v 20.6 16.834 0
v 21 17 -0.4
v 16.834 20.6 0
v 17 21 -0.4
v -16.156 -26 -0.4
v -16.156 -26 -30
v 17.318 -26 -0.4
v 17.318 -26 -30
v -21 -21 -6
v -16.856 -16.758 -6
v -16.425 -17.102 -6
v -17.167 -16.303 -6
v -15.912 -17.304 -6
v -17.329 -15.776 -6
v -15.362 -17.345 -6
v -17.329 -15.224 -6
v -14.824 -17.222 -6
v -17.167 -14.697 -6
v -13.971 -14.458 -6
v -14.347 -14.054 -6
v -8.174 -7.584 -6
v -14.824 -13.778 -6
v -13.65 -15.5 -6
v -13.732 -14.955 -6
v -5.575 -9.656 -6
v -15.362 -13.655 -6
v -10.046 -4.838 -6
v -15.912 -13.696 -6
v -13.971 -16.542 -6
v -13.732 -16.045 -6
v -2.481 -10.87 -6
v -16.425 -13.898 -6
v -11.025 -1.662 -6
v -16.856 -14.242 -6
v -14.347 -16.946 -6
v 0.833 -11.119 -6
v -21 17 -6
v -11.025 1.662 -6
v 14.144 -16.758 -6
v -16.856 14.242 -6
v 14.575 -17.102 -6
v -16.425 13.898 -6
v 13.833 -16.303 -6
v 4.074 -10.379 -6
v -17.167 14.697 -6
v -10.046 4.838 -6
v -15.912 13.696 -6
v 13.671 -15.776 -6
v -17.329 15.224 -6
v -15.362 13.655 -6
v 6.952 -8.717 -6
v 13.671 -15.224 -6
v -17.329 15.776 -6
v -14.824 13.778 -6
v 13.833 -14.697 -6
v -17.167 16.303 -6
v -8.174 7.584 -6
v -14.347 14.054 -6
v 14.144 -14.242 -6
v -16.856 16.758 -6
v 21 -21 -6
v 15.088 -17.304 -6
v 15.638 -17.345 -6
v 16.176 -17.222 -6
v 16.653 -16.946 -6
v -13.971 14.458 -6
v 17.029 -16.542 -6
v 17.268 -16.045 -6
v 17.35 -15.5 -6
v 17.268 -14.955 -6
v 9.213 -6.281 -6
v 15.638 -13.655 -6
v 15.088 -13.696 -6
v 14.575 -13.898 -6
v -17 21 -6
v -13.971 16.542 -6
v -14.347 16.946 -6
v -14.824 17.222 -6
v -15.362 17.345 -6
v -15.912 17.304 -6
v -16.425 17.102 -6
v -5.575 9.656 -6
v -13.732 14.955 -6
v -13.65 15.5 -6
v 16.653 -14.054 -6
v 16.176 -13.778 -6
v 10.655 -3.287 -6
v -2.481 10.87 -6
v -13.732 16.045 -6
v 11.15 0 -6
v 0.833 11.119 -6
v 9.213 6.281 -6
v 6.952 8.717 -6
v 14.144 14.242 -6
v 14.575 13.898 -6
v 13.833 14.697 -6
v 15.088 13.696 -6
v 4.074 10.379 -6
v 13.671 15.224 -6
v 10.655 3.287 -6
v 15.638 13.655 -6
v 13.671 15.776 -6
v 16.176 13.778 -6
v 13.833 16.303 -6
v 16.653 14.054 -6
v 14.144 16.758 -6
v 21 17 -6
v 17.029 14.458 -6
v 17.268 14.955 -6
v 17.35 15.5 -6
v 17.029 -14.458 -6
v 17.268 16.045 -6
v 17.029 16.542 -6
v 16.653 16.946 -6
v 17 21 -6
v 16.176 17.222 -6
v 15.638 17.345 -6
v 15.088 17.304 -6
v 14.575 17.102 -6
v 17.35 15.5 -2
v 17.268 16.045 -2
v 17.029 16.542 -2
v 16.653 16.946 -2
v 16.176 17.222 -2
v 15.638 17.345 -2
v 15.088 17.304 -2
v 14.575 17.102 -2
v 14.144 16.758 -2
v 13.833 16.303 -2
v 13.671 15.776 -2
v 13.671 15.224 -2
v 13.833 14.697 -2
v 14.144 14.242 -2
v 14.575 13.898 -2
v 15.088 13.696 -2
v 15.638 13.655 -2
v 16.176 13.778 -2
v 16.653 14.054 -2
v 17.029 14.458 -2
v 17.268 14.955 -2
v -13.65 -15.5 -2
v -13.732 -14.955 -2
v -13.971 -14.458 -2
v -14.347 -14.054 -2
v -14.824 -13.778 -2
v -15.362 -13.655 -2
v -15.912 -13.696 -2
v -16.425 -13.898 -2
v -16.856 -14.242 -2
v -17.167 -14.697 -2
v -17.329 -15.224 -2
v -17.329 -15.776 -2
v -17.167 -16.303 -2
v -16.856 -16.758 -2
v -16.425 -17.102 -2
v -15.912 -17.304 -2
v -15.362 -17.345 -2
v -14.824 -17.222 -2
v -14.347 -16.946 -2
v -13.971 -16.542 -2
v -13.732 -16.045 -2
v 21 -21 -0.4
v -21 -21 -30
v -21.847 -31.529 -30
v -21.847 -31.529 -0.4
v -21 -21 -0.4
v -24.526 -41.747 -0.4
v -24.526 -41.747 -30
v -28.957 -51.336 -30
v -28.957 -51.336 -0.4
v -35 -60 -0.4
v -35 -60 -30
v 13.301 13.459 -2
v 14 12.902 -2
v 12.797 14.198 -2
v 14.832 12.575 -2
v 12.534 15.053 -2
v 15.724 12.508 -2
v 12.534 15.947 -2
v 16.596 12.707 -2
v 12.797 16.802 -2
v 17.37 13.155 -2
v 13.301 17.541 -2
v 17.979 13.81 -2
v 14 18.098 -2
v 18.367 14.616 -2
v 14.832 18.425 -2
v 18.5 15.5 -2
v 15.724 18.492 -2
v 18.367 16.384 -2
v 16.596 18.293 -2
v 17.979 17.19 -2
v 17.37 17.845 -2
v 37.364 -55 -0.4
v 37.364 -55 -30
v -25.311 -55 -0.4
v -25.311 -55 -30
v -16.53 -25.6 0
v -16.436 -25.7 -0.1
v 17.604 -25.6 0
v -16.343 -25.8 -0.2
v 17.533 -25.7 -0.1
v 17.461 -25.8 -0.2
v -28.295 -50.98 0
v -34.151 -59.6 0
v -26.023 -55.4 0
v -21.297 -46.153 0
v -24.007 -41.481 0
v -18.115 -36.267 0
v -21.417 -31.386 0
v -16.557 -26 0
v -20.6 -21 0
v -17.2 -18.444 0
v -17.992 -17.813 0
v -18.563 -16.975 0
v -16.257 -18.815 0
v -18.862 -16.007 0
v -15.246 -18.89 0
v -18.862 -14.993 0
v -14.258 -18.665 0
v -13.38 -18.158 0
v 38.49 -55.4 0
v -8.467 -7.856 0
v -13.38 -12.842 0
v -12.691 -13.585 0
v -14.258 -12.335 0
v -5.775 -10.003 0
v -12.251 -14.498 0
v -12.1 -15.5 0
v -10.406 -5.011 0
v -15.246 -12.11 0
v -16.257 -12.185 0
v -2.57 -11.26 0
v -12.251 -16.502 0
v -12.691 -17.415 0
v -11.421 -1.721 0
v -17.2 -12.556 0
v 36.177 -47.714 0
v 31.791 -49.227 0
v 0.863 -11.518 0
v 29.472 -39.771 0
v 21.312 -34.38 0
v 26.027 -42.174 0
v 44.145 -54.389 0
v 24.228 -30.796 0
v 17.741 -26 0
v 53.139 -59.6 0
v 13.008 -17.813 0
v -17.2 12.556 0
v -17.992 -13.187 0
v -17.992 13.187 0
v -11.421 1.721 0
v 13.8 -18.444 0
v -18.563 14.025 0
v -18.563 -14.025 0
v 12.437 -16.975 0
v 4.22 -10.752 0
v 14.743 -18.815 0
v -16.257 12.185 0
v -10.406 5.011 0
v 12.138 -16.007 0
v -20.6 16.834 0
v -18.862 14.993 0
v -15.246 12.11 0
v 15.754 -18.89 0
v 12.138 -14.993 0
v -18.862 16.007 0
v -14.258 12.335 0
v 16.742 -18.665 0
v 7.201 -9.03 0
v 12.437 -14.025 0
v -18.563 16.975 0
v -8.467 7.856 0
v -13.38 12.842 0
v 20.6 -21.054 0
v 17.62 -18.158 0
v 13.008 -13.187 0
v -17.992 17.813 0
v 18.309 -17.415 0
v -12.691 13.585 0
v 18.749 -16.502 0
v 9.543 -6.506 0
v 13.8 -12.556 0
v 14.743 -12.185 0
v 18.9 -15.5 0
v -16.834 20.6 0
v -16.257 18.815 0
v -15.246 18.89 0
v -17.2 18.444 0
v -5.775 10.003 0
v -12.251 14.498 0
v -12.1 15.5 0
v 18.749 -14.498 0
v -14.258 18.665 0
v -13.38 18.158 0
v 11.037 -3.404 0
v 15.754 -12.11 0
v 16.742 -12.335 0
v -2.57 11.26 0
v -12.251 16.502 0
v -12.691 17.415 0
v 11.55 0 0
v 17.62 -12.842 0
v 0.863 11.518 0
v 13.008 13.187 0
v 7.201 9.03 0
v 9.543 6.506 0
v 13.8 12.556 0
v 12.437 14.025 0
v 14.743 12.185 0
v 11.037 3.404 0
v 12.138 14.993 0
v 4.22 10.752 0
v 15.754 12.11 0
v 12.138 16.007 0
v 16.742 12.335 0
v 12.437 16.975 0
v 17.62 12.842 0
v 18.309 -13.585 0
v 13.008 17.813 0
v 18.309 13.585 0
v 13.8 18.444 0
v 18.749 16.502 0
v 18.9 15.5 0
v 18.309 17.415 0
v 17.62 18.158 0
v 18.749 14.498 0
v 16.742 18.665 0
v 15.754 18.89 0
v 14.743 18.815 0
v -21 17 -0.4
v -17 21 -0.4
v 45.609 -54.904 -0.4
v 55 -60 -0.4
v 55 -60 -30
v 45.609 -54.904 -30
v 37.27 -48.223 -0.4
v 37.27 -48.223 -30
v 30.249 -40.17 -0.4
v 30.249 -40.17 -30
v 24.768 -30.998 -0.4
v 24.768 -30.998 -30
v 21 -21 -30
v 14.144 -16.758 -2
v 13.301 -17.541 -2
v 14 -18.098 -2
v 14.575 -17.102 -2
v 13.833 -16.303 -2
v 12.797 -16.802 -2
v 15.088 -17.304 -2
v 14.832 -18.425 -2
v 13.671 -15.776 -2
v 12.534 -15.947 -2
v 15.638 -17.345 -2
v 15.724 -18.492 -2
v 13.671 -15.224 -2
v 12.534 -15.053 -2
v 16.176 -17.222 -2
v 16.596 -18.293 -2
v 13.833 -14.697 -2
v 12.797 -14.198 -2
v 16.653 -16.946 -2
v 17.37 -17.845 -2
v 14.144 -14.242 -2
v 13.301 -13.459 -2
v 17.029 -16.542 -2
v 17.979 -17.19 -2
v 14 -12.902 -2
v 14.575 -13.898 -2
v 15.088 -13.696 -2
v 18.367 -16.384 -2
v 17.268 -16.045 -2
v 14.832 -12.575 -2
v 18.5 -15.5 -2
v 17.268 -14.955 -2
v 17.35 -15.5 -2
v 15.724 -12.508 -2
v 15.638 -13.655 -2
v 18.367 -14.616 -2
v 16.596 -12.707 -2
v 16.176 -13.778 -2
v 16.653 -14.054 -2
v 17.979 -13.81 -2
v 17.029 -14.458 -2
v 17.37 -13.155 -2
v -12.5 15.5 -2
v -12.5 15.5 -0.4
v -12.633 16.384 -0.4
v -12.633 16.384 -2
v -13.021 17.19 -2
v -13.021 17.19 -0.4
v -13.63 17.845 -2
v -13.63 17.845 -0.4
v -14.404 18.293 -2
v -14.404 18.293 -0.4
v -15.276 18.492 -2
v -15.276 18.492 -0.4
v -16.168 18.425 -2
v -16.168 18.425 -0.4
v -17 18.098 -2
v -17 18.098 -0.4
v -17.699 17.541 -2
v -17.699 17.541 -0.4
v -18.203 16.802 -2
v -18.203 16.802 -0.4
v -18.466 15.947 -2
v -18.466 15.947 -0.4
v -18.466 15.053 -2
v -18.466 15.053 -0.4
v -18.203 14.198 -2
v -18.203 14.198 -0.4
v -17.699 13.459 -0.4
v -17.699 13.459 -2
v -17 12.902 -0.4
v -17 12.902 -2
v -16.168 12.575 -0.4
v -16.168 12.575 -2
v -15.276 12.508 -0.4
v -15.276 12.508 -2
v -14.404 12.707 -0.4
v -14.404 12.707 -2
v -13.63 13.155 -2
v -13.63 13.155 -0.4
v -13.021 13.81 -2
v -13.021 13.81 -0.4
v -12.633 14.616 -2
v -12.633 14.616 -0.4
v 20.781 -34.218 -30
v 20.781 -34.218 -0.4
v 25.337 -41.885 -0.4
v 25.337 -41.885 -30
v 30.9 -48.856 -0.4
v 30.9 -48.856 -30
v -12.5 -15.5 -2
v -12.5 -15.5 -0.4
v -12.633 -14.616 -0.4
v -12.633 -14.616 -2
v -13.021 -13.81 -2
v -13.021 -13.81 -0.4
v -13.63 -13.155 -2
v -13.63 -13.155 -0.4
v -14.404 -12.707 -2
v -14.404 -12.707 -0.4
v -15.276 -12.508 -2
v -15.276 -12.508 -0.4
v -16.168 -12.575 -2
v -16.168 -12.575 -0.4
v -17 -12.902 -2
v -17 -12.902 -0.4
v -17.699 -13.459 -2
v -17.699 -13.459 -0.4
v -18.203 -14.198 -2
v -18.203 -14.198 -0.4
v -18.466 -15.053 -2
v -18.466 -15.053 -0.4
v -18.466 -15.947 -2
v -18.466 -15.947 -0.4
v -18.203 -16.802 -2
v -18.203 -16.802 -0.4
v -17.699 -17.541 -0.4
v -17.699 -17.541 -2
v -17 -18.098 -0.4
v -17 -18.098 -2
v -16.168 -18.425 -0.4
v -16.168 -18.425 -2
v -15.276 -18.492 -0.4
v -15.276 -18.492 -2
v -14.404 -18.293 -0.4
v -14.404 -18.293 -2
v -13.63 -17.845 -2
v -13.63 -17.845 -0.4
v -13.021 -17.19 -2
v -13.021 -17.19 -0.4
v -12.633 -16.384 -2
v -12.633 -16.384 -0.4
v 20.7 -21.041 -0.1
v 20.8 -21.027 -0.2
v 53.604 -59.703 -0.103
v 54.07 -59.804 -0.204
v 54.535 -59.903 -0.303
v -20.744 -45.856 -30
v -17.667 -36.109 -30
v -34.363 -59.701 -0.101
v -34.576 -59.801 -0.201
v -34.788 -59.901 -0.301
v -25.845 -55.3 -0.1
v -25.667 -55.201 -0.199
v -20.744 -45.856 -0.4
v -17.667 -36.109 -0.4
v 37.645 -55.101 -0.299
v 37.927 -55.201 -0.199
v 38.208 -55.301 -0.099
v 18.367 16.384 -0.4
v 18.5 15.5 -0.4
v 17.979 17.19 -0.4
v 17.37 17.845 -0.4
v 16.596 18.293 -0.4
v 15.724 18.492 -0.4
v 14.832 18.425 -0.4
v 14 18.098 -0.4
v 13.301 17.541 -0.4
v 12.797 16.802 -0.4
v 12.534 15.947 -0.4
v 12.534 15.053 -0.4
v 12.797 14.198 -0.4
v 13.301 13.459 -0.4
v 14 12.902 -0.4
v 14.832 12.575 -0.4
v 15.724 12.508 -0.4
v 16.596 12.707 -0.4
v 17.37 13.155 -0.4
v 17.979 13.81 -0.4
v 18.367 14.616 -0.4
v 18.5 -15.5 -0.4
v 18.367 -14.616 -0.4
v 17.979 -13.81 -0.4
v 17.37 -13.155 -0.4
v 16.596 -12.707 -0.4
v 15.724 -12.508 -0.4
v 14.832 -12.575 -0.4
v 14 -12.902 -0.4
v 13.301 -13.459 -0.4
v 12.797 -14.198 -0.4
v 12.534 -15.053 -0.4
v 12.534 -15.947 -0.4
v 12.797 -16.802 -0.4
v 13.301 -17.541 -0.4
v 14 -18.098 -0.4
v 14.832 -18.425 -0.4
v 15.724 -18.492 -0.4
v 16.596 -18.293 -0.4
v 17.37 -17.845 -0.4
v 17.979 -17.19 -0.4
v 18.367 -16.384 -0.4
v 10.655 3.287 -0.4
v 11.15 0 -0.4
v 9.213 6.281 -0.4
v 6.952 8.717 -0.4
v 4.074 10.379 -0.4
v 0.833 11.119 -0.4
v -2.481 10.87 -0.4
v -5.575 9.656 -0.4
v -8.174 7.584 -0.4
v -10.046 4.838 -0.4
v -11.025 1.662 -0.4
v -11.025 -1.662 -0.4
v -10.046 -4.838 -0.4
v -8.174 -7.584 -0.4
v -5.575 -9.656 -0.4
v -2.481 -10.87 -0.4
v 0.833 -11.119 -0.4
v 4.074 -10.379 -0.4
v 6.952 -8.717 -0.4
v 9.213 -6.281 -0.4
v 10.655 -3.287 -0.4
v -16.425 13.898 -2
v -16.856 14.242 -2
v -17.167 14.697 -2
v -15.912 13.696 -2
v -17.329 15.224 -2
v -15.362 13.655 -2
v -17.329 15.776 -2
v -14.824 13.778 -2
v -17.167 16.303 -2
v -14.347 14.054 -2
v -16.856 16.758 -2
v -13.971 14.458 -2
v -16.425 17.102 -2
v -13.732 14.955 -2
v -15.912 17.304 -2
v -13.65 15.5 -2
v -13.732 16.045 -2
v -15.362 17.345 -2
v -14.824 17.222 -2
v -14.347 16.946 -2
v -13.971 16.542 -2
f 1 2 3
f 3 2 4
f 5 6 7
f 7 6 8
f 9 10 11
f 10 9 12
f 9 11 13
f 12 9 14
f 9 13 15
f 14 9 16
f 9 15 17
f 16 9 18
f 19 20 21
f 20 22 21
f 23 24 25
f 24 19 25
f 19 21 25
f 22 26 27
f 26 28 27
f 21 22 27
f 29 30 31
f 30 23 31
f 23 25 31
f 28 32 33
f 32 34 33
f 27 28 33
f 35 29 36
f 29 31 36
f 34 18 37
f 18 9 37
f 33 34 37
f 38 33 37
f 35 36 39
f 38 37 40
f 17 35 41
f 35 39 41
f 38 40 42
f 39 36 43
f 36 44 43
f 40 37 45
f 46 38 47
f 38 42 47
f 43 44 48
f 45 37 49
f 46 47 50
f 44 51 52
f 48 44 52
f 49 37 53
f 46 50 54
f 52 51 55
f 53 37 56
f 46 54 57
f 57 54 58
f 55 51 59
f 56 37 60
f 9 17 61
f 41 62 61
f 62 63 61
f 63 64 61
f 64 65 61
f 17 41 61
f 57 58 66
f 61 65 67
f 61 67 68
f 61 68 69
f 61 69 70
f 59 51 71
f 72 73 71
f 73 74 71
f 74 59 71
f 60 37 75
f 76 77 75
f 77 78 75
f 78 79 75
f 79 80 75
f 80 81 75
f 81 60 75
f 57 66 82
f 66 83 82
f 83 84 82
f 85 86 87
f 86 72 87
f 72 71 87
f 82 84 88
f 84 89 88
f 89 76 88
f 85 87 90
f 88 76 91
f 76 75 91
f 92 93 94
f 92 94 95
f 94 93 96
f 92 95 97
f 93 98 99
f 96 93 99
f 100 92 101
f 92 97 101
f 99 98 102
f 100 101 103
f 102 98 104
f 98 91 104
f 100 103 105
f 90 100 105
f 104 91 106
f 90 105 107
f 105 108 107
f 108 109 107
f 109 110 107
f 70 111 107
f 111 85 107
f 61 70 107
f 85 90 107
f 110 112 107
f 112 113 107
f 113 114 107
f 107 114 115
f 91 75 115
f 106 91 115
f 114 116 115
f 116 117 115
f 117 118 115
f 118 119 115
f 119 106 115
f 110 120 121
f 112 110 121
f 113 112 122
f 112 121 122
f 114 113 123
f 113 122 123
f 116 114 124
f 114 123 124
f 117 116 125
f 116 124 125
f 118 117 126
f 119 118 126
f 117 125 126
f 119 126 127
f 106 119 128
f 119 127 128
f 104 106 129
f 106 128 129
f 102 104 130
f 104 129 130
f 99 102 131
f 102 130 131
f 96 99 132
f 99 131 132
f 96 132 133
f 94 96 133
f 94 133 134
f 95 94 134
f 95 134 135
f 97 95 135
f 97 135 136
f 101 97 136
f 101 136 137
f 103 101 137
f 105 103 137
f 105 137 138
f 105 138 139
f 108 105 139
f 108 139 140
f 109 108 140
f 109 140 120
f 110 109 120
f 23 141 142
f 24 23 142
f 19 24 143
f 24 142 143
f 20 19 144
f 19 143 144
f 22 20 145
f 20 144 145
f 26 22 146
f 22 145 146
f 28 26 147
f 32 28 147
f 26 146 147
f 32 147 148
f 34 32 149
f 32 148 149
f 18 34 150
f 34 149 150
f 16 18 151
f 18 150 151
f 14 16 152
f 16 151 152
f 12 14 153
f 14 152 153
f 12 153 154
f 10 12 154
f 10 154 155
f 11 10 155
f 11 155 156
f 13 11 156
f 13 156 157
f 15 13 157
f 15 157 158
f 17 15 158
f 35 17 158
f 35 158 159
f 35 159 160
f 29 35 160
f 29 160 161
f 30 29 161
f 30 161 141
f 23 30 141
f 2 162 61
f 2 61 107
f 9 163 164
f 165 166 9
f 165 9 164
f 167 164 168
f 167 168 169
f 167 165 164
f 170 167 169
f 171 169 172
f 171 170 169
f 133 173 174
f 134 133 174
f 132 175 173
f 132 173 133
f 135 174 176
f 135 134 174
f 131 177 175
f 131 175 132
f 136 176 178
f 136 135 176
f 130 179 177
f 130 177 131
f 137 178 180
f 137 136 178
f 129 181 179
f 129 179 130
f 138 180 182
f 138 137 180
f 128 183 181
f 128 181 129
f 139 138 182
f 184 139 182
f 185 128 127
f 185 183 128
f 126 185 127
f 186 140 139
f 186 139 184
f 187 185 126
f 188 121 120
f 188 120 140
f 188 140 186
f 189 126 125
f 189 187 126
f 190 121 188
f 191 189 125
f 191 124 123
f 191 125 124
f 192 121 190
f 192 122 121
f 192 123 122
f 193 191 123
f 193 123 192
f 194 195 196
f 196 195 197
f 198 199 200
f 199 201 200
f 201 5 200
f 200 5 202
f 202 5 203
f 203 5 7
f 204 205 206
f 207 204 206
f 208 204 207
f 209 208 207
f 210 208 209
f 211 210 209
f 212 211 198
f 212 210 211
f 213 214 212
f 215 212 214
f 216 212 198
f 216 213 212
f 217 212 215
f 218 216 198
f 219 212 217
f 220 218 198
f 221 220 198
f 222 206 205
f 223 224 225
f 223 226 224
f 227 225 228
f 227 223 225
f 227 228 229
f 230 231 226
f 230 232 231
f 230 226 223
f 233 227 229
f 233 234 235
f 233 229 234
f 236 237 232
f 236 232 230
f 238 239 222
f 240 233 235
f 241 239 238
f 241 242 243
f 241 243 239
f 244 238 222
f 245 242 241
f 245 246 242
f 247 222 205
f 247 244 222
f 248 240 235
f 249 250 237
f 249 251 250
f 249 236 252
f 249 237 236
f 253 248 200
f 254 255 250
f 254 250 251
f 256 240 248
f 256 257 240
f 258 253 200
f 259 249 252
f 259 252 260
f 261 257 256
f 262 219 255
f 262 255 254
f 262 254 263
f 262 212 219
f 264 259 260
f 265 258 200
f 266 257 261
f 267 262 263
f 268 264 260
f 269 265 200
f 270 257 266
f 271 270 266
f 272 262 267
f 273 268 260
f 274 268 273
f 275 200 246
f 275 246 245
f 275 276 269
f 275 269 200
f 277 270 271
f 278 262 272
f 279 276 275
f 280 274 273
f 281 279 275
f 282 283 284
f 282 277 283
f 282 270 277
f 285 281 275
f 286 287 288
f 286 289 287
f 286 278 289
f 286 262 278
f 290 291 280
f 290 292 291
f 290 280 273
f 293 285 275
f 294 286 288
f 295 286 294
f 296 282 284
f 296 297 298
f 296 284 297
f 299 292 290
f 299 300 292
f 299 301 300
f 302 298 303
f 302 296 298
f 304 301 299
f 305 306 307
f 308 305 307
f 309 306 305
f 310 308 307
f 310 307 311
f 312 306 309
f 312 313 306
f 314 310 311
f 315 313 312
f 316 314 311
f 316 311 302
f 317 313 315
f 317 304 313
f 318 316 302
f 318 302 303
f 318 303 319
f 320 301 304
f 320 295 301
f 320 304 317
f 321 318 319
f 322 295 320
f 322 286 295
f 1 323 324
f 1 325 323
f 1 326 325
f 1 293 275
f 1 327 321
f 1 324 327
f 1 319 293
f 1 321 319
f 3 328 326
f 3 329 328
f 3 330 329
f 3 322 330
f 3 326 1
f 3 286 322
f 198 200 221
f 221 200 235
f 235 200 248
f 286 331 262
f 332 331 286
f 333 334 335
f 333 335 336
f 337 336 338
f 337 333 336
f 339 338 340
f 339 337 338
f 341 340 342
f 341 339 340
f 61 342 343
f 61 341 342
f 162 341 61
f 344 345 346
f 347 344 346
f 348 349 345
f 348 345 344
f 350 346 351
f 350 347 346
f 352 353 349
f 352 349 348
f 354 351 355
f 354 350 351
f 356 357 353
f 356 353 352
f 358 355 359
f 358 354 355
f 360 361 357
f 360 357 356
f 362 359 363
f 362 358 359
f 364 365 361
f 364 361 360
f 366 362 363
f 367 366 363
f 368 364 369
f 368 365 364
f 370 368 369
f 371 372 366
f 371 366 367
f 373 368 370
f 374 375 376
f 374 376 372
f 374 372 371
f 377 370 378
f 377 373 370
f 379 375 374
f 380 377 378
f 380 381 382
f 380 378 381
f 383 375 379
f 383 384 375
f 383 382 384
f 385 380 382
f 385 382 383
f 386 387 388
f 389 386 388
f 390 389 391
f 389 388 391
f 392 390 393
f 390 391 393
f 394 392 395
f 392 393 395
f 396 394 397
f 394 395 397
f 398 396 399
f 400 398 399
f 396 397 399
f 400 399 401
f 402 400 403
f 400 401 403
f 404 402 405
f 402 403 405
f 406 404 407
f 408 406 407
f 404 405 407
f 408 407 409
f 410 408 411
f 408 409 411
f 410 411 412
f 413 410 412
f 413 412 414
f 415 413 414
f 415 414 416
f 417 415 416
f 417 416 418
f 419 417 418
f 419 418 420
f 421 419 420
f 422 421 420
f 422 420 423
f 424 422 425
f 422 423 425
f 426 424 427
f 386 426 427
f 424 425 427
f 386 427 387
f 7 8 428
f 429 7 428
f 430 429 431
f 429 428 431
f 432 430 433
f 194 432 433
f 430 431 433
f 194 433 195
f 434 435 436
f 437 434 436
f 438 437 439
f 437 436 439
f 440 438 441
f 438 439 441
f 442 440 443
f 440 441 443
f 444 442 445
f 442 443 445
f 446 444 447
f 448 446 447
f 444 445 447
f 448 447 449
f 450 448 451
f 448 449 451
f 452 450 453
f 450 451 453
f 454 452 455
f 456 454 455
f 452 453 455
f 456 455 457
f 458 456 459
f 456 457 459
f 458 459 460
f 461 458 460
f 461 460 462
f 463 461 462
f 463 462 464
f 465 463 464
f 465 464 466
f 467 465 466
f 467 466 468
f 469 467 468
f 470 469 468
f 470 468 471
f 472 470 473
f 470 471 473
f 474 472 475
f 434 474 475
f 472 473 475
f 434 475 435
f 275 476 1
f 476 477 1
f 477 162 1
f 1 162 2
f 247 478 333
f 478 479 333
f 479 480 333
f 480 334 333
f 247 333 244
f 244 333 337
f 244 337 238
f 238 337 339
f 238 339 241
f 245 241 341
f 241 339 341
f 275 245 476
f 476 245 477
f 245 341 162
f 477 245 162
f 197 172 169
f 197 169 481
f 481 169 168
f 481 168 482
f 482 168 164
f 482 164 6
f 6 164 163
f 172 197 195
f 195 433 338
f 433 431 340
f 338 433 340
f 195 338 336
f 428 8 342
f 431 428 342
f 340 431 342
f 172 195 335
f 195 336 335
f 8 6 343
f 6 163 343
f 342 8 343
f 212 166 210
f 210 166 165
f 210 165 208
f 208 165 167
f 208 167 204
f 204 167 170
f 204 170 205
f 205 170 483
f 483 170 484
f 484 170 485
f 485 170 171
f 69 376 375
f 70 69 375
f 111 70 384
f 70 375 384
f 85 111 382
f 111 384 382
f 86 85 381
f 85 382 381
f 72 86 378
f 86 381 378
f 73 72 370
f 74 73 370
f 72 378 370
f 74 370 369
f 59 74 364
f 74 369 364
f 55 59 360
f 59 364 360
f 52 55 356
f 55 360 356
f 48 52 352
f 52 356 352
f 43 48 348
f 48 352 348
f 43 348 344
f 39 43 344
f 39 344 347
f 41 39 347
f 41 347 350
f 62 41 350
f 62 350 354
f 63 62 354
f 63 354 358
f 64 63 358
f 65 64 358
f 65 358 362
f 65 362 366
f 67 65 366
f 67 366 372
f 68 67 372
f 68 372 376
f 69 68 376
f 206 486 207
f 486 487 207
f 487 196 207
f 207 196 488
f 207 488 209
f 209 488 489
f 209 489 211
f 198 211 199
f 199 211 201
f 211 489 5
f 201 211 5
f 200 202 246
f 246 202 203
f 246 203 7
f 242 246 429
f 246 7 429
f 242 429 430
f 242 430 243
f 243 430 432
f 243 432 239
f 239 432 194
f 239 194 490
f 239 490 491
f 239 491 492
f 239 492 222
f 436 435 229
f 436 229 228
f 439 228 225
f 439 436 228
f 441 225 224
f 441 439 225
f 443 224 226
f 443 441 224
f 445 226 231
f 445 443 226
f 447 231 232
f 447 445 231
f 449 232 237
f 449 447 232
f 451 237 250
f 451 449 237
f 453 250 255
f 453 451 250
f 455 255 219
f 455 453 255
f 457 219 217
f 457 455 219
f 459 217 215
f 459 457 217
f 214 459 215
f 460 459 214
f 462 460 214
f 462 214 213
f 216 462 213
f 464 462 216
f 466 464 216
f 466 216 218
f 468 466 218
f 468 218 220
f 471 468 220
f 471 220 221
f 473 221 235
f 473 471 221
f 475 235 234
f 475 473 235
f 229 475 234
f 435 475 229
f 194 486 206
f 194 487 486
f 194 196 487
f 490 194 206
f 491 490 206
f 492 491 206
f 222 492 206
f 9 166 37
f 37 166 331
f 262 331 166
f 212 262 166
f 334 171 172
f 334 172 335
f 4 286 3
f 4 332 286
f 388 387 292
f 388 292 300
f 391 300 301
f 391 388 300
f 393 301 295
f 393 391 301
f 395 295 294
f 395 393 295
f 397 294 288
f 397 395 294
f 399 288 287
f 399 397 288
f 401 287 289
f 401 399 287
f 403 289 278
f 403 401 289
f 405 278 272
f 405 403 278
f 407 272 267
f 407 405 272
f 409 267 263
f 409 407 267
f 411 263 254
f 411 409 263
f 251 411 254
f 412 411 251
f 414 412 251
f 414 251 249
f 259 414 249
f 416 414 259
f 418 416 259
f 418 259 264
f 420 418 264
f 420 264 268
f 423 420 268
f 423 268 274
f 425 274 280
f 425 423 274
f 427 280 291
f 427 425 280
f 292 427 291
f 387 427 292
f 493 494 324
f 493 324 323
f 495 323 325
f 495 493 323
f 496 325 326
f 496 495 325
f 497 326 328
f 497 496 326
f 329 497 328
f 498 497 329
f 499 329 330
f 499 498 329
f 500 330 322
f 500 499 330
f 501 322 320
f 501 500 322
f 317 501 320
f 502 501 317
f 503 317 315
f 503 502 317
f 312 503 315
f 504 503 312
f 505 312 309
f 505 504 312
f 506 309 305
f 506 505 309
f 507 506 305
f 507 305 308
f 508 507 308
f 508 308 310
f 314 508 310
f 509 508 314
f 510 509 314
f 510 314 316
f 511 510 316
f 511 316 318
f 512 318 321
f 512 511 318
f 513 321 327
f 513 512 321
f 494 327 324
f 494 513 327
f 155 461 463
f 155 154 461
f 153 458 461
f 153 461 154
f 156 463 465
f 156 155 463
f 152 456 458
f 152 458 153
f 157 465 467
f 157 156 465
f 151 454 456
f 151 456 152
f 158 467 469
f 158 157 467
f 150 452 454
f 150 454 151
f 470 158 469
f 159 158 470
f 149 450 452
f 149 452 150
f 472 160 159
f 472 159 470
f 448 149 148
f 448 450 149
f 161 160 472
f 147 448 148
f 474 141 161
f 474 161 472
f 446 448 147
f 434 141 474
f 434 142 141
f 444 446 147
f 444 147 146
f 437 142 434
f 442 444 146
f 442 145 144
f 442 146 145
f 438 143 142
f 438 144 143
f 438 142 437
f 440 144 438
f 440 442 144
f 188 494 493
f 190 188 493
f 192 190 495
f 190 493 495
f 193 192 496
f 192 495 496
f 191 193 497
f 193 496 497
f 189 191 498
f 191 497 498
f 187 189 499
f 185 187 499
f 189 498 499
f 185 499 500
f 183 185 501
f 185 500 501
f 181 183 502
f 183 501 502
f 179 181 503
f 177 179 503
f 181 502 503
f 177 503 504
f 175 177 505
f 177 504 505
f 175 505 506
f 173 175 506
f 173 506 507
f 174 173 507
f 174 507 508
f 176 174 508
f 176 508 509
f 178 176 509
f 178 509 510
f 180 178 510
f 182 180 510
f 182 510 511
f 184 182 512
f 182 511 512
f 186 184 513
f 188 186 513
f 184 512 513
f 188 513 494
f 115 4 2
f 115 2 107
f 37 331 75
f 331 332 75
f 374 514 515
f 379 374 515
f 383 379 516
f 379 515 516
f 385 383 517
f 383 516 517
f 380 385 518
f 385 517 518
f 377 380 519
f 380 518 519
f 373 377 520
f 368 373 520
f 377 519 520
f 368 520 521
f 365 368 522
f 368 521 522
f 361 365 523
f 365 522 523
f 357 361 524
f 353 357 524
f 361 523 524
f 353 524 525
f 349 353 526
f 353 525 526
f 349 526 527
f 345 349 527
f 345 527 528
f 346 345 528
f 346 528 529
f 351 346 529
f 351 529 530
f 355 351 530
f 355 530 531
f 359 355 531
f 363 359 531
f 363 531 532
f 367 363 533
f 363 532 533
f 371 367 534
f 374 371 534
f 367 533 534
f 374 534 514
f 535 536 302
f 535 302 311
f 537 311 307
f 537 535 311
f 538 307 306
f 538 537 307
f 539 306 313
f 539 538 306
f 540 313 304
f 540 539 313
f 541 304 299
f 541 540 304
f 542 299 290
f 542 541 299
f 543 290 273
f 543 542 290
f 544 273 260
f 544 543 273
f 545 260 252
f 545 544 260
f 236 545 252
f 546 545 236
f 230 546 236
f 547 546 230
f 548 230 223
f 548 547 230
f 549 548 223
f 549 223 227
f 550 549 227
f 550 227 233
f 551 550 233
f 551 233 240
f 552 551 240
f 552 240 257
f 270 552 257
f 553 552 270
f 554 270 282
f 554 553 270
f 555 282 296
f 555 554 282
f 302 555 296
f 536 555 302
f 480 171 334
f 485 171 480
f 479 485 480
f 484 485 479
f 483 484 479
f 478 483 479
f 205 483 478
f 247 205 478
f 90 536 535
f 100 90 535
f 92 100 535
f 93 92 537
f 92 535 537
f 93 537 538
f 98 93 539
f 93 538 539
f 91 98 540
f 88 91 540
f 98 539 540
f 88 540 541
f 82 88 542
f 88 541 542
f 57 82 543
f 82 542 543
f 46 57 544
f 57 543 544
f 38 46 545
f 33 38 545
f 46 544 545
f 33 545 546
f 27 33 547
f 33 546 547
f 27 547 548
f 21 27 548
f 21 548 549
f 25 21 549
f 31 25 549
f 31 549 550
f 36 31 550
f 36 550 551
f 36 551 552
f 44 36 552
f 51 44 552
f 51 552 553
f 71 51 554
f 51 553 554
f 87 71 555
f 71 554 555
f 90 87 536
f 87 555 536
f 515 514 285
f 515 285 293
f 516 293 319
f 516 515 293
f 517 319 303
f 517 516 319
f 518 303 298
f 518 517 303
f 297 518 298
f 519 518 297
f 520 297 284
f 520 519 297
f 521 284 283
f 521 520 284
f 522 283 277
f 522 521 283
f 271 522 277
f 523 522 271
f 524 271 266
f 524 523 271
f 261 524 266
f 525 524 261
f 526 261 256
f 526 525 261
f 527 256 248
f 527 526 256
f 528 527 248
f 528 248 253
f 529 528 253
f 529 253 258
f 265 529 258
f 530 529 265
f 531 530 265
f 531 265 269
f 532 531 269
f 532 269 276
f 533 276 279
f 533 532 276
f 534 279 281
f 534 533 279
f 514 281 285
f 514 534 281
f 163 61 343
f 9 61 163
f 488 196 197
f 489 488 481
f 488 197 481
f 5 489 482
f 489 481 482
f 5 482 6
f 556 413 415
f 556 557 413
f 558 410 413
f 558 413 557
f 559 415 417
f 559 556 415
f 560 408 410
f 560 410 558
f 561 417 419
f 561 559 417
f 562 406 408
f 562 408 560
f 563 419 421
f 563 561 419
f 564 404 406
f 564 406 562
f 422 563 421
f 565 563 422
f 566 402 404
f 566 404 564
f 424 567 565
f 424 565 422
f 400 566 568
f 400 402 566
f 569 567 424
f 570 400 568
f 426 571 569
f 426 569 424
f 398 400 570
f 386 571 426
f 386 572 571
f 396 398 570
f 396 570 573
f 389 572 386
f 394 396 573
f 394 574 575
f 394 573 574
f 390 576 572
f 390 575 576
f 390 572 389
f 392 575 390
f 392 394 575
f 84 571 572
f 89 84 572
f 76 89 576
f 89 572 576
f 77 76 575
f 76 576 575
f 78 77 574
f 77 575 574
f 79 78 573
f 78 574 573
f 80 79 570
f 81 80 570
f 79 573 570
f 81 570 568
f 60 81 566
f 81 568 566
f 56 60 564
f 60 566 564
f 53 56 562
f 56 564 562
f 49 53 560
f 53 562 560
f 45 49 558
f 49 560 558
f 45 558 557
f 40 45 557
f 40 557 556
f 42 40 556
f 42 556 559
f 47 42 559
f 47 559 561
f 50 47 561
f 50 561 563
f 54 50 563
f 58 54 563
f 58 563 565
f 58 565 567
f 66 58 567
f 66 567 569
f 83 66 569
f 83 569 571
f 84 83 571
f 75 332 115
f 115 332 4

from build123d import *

# Parameters (mm, degrees)
SKETCH1_W           = 42
SKETCH1_H           = 42
SKETCH1_R           = 11.15
SKETCH1_R_2         = 1.85
BOSS_EXTRUDE1_DEPTH = 6
BOSS_EXTRUDE2_DEPTH = 30
CUT_EXTRUDE1_DEPTH  = 87.746757864
SKETCH4_R           = 3
CUT_EXTRUDE2_DEPTH  = 2
CHAMFER1_SIZE       = 4
CHAMFER2_SIZE       = 0.4


with BuildPart() as part:
    # Sketch1 → Boss-Extrude1 (new body)
    with BuildSketch(Plane.XY):
        Rectangle(SKETCH1_W, SKETCH1_H)
        Circle(SKETCH1_R, mode=Mode.SUBTRACT)
        with Locations((15.5, 15.5)):
            Circle(SKETCH1_R_2, mode=Mode.SUBTRACT)
        with Locations((-15.5, 15.5)):
            Circle(SKETCH1_R_2, mode=Mode.SUBTRACT)
        with Locations((-15.5, -15.5)):
            Circle(SKETCH1_R_2, mode=Mode.SUBTRACT)
        with Locations((15.5, -15.5)):
            Circle(SKETCH1_R_2, mode=Mode.SUBTRACT)
    extrude(amount=-BOSS_EXTRUDE1_DEPTH)

    # Sketch2 → Boss-Extrude2 (add)
    with BuildSketch(Plane.XY):
        with BuildLine():
            Line((-35, -60), (55, -60))
            ThreePointArc((55, -60), (33.580179579, -44.353176778), (21, -21))
            Line((21, -21), (-21, -21))
            ThreePointArc((-21, -21), (-24.526439247, -41.746919245), (-35, -60))
        make_face()
    extrude(amount=-BOSS_EXTRUDE2_DEPTH)

    # Sketch3 → Cut-Extrude1 (cut, through all)
    with BuildSketch(Plane(origin=(0, 0, -30), x_dir=(-1, 0, 0), z_dir=(0, 0, -1))):
        with BuildLine():
            Line((-37.363801429, -55), (25.310808042, -55))
            ThreePointArc((25.310808042, -55), (19.013466657, -41.042936644), (16.155813219, -26))
            Line((16.155813219, -26), (-17.317950087, -26))
            ThreePointArc((-17.317950087, -26), (-25.337253654, -41.884976236), (-37.363801429, -55))
        make_face()
    extrude(amount=-CUT_EXTRUDE1_DEPTH, mode=Mode.SUBTRACT)

    # Sketch4 → Cut-Extrude2 (cut)
    with BuildSketch(Plane.XY):
        with Locations((15.5, 15.5)):
            Circle(SKETCH4_R)
        with Locations((15.5, -15.5)):
            Circle(SKETCH4_R)
        with Locations((-15.5, -15.5)):
            Circle(SKETCH4_R)
        with Locations((-15.5, 15.5)):
            Circle(SKETCH4_R)
    extrude(amount=-CUT_EXTRUDE2_DEPTH, mode=Mode.SUBTRACT)

    # Chamfer1
    chamfer1_edges = [part.edges().sort_by_distance(p)[0] for p in [
        (-21, 21, -3),
        (21, 21, -3),
    ]]
    chamfer(chamfer1_edges, length=CHAMFER1_SIZE)

    # Chamfer2
    chamfer2_edges = [part.edges().sort_by_distance(p)[0] for p in [
        (21, -2, 0),
    ]]
    chamfer(chamfer2_edges, length=CHAMFER2_SIZE)
    chamfer2_2_edges = [part.edges().sort_by_distance(p)[0] for p in [
        (18.8, 19.2, 0),
    ]]
    chamfer(chamfer2_2_edges, length=CHAMFER2_SIZE)
    chamfer2_3_edges = [part.edges().sort_by_distance(p)[0] for p in [
        (33.580179579, -44.353176778, 0),
    ]]
    chamfer(chamfer2_3_edges, length=CHAMFER2_SIZE)
    chamfer2_4_edges = [part.edges().sort_by_distance(p)[0] for p in [
        (-0.282842712, 21, 0),
    ]]
    chamfer(chamfer2_4_edges, length=CHAMFER2_SIZE)
    chamfer2_5_edges = [part.edges().sort_by_distance(p)[0] for p in [
        (9.504567043, -60, 0),
    ]]
    chamfer(chamfer2_5_edges, length=CHAMFER2_SIZE)
    chamfer2_6_edges = [part.edges().sort_by_distance(p)[0] for p in [
        (-19.2, 18.8, 0),
    ]]
    chamfer(chamfer2_6_edges, length=CHAMFER2_SIZE)
    chamfer2_7_edges = [part.edges().sort_by_distance(p)[0] for p in [
        (-24.439144818, -41.502075341, 0),
        (-21, -2.282842712, 0),
    ]]
    chamfer(chamfer2_7_edges, length=CHAMFER2_SIZE)
    chamfer2_8_edges = [part.edges().sort_by_distance(p)[0] for p in [
        (6.026496693, -55, 0),
    ]]
    chamfer(chamfer2_8_edges, length=CHAMFER2_SIZE)
    chamfer2_9_edges = [part.edges().sort_by_distance(p)[0] for p in [
        (-19.013466657, -41.042936644, 0),
    ]]
    chamfer(chamfer2_9_edges, length=CHAMFER2_SIZE)
    chamfer2_10_edges = [part.edges().sort_by_distance(p)[0] for p in [
        (25.337253654, -41.884976236, 0),
    ]]
    chamfer(chamfer2_10_edges, length=CHAMFER2_SIZE)
    chamfer2_11_edges = [part.edges().sort_by_distance(p)[0] for p in [
        (0.581068434, -26, 0),
    ]]
    chamfer(chamfer2_11_edges, length=CHAMFER2_SIZE)
    chamfer2_12_edges = [part.edges().sort_by_distance(p)[0] for p in [
        (-18.5, -15.5, 0),
    ]]
    chamfer(chamfer2_12_edges, length=CHAMFER2_SIZE)
    chamfer2_13_edges = [part.edges().sort_by_distance(p)[0] for p in [
        (-11.15, 0, 0),
    ]]
    chamfer(chamfer2_13_edges, length=CHAMFER2_SIZE)
    chamfer2_14_edges = [part.edges().sort_by_distance(p)[0] for p in [
        (-18.5, 15.5, 0),
    ]]
    chamfer(chamfer2_14_edges, length=CHAMFER2_SIZE)
    chamfer2_15_edges = [part.edges().sort_by_distance(p)[0] for p in [
        (12.5, -15.5, 0),
    ]]
    chamfer(chamfer2_15_edges, length=CHAMFER2_SIZE)
    chamfer2_16_edges = [part.edges().sort_by_distance(p)[0] for p in [
        (12.5, 15.5, 0),
    ]]
    chamfer(chamfer2_16_edges, length=CHAMFER2_SIZE)


solid = part.part
